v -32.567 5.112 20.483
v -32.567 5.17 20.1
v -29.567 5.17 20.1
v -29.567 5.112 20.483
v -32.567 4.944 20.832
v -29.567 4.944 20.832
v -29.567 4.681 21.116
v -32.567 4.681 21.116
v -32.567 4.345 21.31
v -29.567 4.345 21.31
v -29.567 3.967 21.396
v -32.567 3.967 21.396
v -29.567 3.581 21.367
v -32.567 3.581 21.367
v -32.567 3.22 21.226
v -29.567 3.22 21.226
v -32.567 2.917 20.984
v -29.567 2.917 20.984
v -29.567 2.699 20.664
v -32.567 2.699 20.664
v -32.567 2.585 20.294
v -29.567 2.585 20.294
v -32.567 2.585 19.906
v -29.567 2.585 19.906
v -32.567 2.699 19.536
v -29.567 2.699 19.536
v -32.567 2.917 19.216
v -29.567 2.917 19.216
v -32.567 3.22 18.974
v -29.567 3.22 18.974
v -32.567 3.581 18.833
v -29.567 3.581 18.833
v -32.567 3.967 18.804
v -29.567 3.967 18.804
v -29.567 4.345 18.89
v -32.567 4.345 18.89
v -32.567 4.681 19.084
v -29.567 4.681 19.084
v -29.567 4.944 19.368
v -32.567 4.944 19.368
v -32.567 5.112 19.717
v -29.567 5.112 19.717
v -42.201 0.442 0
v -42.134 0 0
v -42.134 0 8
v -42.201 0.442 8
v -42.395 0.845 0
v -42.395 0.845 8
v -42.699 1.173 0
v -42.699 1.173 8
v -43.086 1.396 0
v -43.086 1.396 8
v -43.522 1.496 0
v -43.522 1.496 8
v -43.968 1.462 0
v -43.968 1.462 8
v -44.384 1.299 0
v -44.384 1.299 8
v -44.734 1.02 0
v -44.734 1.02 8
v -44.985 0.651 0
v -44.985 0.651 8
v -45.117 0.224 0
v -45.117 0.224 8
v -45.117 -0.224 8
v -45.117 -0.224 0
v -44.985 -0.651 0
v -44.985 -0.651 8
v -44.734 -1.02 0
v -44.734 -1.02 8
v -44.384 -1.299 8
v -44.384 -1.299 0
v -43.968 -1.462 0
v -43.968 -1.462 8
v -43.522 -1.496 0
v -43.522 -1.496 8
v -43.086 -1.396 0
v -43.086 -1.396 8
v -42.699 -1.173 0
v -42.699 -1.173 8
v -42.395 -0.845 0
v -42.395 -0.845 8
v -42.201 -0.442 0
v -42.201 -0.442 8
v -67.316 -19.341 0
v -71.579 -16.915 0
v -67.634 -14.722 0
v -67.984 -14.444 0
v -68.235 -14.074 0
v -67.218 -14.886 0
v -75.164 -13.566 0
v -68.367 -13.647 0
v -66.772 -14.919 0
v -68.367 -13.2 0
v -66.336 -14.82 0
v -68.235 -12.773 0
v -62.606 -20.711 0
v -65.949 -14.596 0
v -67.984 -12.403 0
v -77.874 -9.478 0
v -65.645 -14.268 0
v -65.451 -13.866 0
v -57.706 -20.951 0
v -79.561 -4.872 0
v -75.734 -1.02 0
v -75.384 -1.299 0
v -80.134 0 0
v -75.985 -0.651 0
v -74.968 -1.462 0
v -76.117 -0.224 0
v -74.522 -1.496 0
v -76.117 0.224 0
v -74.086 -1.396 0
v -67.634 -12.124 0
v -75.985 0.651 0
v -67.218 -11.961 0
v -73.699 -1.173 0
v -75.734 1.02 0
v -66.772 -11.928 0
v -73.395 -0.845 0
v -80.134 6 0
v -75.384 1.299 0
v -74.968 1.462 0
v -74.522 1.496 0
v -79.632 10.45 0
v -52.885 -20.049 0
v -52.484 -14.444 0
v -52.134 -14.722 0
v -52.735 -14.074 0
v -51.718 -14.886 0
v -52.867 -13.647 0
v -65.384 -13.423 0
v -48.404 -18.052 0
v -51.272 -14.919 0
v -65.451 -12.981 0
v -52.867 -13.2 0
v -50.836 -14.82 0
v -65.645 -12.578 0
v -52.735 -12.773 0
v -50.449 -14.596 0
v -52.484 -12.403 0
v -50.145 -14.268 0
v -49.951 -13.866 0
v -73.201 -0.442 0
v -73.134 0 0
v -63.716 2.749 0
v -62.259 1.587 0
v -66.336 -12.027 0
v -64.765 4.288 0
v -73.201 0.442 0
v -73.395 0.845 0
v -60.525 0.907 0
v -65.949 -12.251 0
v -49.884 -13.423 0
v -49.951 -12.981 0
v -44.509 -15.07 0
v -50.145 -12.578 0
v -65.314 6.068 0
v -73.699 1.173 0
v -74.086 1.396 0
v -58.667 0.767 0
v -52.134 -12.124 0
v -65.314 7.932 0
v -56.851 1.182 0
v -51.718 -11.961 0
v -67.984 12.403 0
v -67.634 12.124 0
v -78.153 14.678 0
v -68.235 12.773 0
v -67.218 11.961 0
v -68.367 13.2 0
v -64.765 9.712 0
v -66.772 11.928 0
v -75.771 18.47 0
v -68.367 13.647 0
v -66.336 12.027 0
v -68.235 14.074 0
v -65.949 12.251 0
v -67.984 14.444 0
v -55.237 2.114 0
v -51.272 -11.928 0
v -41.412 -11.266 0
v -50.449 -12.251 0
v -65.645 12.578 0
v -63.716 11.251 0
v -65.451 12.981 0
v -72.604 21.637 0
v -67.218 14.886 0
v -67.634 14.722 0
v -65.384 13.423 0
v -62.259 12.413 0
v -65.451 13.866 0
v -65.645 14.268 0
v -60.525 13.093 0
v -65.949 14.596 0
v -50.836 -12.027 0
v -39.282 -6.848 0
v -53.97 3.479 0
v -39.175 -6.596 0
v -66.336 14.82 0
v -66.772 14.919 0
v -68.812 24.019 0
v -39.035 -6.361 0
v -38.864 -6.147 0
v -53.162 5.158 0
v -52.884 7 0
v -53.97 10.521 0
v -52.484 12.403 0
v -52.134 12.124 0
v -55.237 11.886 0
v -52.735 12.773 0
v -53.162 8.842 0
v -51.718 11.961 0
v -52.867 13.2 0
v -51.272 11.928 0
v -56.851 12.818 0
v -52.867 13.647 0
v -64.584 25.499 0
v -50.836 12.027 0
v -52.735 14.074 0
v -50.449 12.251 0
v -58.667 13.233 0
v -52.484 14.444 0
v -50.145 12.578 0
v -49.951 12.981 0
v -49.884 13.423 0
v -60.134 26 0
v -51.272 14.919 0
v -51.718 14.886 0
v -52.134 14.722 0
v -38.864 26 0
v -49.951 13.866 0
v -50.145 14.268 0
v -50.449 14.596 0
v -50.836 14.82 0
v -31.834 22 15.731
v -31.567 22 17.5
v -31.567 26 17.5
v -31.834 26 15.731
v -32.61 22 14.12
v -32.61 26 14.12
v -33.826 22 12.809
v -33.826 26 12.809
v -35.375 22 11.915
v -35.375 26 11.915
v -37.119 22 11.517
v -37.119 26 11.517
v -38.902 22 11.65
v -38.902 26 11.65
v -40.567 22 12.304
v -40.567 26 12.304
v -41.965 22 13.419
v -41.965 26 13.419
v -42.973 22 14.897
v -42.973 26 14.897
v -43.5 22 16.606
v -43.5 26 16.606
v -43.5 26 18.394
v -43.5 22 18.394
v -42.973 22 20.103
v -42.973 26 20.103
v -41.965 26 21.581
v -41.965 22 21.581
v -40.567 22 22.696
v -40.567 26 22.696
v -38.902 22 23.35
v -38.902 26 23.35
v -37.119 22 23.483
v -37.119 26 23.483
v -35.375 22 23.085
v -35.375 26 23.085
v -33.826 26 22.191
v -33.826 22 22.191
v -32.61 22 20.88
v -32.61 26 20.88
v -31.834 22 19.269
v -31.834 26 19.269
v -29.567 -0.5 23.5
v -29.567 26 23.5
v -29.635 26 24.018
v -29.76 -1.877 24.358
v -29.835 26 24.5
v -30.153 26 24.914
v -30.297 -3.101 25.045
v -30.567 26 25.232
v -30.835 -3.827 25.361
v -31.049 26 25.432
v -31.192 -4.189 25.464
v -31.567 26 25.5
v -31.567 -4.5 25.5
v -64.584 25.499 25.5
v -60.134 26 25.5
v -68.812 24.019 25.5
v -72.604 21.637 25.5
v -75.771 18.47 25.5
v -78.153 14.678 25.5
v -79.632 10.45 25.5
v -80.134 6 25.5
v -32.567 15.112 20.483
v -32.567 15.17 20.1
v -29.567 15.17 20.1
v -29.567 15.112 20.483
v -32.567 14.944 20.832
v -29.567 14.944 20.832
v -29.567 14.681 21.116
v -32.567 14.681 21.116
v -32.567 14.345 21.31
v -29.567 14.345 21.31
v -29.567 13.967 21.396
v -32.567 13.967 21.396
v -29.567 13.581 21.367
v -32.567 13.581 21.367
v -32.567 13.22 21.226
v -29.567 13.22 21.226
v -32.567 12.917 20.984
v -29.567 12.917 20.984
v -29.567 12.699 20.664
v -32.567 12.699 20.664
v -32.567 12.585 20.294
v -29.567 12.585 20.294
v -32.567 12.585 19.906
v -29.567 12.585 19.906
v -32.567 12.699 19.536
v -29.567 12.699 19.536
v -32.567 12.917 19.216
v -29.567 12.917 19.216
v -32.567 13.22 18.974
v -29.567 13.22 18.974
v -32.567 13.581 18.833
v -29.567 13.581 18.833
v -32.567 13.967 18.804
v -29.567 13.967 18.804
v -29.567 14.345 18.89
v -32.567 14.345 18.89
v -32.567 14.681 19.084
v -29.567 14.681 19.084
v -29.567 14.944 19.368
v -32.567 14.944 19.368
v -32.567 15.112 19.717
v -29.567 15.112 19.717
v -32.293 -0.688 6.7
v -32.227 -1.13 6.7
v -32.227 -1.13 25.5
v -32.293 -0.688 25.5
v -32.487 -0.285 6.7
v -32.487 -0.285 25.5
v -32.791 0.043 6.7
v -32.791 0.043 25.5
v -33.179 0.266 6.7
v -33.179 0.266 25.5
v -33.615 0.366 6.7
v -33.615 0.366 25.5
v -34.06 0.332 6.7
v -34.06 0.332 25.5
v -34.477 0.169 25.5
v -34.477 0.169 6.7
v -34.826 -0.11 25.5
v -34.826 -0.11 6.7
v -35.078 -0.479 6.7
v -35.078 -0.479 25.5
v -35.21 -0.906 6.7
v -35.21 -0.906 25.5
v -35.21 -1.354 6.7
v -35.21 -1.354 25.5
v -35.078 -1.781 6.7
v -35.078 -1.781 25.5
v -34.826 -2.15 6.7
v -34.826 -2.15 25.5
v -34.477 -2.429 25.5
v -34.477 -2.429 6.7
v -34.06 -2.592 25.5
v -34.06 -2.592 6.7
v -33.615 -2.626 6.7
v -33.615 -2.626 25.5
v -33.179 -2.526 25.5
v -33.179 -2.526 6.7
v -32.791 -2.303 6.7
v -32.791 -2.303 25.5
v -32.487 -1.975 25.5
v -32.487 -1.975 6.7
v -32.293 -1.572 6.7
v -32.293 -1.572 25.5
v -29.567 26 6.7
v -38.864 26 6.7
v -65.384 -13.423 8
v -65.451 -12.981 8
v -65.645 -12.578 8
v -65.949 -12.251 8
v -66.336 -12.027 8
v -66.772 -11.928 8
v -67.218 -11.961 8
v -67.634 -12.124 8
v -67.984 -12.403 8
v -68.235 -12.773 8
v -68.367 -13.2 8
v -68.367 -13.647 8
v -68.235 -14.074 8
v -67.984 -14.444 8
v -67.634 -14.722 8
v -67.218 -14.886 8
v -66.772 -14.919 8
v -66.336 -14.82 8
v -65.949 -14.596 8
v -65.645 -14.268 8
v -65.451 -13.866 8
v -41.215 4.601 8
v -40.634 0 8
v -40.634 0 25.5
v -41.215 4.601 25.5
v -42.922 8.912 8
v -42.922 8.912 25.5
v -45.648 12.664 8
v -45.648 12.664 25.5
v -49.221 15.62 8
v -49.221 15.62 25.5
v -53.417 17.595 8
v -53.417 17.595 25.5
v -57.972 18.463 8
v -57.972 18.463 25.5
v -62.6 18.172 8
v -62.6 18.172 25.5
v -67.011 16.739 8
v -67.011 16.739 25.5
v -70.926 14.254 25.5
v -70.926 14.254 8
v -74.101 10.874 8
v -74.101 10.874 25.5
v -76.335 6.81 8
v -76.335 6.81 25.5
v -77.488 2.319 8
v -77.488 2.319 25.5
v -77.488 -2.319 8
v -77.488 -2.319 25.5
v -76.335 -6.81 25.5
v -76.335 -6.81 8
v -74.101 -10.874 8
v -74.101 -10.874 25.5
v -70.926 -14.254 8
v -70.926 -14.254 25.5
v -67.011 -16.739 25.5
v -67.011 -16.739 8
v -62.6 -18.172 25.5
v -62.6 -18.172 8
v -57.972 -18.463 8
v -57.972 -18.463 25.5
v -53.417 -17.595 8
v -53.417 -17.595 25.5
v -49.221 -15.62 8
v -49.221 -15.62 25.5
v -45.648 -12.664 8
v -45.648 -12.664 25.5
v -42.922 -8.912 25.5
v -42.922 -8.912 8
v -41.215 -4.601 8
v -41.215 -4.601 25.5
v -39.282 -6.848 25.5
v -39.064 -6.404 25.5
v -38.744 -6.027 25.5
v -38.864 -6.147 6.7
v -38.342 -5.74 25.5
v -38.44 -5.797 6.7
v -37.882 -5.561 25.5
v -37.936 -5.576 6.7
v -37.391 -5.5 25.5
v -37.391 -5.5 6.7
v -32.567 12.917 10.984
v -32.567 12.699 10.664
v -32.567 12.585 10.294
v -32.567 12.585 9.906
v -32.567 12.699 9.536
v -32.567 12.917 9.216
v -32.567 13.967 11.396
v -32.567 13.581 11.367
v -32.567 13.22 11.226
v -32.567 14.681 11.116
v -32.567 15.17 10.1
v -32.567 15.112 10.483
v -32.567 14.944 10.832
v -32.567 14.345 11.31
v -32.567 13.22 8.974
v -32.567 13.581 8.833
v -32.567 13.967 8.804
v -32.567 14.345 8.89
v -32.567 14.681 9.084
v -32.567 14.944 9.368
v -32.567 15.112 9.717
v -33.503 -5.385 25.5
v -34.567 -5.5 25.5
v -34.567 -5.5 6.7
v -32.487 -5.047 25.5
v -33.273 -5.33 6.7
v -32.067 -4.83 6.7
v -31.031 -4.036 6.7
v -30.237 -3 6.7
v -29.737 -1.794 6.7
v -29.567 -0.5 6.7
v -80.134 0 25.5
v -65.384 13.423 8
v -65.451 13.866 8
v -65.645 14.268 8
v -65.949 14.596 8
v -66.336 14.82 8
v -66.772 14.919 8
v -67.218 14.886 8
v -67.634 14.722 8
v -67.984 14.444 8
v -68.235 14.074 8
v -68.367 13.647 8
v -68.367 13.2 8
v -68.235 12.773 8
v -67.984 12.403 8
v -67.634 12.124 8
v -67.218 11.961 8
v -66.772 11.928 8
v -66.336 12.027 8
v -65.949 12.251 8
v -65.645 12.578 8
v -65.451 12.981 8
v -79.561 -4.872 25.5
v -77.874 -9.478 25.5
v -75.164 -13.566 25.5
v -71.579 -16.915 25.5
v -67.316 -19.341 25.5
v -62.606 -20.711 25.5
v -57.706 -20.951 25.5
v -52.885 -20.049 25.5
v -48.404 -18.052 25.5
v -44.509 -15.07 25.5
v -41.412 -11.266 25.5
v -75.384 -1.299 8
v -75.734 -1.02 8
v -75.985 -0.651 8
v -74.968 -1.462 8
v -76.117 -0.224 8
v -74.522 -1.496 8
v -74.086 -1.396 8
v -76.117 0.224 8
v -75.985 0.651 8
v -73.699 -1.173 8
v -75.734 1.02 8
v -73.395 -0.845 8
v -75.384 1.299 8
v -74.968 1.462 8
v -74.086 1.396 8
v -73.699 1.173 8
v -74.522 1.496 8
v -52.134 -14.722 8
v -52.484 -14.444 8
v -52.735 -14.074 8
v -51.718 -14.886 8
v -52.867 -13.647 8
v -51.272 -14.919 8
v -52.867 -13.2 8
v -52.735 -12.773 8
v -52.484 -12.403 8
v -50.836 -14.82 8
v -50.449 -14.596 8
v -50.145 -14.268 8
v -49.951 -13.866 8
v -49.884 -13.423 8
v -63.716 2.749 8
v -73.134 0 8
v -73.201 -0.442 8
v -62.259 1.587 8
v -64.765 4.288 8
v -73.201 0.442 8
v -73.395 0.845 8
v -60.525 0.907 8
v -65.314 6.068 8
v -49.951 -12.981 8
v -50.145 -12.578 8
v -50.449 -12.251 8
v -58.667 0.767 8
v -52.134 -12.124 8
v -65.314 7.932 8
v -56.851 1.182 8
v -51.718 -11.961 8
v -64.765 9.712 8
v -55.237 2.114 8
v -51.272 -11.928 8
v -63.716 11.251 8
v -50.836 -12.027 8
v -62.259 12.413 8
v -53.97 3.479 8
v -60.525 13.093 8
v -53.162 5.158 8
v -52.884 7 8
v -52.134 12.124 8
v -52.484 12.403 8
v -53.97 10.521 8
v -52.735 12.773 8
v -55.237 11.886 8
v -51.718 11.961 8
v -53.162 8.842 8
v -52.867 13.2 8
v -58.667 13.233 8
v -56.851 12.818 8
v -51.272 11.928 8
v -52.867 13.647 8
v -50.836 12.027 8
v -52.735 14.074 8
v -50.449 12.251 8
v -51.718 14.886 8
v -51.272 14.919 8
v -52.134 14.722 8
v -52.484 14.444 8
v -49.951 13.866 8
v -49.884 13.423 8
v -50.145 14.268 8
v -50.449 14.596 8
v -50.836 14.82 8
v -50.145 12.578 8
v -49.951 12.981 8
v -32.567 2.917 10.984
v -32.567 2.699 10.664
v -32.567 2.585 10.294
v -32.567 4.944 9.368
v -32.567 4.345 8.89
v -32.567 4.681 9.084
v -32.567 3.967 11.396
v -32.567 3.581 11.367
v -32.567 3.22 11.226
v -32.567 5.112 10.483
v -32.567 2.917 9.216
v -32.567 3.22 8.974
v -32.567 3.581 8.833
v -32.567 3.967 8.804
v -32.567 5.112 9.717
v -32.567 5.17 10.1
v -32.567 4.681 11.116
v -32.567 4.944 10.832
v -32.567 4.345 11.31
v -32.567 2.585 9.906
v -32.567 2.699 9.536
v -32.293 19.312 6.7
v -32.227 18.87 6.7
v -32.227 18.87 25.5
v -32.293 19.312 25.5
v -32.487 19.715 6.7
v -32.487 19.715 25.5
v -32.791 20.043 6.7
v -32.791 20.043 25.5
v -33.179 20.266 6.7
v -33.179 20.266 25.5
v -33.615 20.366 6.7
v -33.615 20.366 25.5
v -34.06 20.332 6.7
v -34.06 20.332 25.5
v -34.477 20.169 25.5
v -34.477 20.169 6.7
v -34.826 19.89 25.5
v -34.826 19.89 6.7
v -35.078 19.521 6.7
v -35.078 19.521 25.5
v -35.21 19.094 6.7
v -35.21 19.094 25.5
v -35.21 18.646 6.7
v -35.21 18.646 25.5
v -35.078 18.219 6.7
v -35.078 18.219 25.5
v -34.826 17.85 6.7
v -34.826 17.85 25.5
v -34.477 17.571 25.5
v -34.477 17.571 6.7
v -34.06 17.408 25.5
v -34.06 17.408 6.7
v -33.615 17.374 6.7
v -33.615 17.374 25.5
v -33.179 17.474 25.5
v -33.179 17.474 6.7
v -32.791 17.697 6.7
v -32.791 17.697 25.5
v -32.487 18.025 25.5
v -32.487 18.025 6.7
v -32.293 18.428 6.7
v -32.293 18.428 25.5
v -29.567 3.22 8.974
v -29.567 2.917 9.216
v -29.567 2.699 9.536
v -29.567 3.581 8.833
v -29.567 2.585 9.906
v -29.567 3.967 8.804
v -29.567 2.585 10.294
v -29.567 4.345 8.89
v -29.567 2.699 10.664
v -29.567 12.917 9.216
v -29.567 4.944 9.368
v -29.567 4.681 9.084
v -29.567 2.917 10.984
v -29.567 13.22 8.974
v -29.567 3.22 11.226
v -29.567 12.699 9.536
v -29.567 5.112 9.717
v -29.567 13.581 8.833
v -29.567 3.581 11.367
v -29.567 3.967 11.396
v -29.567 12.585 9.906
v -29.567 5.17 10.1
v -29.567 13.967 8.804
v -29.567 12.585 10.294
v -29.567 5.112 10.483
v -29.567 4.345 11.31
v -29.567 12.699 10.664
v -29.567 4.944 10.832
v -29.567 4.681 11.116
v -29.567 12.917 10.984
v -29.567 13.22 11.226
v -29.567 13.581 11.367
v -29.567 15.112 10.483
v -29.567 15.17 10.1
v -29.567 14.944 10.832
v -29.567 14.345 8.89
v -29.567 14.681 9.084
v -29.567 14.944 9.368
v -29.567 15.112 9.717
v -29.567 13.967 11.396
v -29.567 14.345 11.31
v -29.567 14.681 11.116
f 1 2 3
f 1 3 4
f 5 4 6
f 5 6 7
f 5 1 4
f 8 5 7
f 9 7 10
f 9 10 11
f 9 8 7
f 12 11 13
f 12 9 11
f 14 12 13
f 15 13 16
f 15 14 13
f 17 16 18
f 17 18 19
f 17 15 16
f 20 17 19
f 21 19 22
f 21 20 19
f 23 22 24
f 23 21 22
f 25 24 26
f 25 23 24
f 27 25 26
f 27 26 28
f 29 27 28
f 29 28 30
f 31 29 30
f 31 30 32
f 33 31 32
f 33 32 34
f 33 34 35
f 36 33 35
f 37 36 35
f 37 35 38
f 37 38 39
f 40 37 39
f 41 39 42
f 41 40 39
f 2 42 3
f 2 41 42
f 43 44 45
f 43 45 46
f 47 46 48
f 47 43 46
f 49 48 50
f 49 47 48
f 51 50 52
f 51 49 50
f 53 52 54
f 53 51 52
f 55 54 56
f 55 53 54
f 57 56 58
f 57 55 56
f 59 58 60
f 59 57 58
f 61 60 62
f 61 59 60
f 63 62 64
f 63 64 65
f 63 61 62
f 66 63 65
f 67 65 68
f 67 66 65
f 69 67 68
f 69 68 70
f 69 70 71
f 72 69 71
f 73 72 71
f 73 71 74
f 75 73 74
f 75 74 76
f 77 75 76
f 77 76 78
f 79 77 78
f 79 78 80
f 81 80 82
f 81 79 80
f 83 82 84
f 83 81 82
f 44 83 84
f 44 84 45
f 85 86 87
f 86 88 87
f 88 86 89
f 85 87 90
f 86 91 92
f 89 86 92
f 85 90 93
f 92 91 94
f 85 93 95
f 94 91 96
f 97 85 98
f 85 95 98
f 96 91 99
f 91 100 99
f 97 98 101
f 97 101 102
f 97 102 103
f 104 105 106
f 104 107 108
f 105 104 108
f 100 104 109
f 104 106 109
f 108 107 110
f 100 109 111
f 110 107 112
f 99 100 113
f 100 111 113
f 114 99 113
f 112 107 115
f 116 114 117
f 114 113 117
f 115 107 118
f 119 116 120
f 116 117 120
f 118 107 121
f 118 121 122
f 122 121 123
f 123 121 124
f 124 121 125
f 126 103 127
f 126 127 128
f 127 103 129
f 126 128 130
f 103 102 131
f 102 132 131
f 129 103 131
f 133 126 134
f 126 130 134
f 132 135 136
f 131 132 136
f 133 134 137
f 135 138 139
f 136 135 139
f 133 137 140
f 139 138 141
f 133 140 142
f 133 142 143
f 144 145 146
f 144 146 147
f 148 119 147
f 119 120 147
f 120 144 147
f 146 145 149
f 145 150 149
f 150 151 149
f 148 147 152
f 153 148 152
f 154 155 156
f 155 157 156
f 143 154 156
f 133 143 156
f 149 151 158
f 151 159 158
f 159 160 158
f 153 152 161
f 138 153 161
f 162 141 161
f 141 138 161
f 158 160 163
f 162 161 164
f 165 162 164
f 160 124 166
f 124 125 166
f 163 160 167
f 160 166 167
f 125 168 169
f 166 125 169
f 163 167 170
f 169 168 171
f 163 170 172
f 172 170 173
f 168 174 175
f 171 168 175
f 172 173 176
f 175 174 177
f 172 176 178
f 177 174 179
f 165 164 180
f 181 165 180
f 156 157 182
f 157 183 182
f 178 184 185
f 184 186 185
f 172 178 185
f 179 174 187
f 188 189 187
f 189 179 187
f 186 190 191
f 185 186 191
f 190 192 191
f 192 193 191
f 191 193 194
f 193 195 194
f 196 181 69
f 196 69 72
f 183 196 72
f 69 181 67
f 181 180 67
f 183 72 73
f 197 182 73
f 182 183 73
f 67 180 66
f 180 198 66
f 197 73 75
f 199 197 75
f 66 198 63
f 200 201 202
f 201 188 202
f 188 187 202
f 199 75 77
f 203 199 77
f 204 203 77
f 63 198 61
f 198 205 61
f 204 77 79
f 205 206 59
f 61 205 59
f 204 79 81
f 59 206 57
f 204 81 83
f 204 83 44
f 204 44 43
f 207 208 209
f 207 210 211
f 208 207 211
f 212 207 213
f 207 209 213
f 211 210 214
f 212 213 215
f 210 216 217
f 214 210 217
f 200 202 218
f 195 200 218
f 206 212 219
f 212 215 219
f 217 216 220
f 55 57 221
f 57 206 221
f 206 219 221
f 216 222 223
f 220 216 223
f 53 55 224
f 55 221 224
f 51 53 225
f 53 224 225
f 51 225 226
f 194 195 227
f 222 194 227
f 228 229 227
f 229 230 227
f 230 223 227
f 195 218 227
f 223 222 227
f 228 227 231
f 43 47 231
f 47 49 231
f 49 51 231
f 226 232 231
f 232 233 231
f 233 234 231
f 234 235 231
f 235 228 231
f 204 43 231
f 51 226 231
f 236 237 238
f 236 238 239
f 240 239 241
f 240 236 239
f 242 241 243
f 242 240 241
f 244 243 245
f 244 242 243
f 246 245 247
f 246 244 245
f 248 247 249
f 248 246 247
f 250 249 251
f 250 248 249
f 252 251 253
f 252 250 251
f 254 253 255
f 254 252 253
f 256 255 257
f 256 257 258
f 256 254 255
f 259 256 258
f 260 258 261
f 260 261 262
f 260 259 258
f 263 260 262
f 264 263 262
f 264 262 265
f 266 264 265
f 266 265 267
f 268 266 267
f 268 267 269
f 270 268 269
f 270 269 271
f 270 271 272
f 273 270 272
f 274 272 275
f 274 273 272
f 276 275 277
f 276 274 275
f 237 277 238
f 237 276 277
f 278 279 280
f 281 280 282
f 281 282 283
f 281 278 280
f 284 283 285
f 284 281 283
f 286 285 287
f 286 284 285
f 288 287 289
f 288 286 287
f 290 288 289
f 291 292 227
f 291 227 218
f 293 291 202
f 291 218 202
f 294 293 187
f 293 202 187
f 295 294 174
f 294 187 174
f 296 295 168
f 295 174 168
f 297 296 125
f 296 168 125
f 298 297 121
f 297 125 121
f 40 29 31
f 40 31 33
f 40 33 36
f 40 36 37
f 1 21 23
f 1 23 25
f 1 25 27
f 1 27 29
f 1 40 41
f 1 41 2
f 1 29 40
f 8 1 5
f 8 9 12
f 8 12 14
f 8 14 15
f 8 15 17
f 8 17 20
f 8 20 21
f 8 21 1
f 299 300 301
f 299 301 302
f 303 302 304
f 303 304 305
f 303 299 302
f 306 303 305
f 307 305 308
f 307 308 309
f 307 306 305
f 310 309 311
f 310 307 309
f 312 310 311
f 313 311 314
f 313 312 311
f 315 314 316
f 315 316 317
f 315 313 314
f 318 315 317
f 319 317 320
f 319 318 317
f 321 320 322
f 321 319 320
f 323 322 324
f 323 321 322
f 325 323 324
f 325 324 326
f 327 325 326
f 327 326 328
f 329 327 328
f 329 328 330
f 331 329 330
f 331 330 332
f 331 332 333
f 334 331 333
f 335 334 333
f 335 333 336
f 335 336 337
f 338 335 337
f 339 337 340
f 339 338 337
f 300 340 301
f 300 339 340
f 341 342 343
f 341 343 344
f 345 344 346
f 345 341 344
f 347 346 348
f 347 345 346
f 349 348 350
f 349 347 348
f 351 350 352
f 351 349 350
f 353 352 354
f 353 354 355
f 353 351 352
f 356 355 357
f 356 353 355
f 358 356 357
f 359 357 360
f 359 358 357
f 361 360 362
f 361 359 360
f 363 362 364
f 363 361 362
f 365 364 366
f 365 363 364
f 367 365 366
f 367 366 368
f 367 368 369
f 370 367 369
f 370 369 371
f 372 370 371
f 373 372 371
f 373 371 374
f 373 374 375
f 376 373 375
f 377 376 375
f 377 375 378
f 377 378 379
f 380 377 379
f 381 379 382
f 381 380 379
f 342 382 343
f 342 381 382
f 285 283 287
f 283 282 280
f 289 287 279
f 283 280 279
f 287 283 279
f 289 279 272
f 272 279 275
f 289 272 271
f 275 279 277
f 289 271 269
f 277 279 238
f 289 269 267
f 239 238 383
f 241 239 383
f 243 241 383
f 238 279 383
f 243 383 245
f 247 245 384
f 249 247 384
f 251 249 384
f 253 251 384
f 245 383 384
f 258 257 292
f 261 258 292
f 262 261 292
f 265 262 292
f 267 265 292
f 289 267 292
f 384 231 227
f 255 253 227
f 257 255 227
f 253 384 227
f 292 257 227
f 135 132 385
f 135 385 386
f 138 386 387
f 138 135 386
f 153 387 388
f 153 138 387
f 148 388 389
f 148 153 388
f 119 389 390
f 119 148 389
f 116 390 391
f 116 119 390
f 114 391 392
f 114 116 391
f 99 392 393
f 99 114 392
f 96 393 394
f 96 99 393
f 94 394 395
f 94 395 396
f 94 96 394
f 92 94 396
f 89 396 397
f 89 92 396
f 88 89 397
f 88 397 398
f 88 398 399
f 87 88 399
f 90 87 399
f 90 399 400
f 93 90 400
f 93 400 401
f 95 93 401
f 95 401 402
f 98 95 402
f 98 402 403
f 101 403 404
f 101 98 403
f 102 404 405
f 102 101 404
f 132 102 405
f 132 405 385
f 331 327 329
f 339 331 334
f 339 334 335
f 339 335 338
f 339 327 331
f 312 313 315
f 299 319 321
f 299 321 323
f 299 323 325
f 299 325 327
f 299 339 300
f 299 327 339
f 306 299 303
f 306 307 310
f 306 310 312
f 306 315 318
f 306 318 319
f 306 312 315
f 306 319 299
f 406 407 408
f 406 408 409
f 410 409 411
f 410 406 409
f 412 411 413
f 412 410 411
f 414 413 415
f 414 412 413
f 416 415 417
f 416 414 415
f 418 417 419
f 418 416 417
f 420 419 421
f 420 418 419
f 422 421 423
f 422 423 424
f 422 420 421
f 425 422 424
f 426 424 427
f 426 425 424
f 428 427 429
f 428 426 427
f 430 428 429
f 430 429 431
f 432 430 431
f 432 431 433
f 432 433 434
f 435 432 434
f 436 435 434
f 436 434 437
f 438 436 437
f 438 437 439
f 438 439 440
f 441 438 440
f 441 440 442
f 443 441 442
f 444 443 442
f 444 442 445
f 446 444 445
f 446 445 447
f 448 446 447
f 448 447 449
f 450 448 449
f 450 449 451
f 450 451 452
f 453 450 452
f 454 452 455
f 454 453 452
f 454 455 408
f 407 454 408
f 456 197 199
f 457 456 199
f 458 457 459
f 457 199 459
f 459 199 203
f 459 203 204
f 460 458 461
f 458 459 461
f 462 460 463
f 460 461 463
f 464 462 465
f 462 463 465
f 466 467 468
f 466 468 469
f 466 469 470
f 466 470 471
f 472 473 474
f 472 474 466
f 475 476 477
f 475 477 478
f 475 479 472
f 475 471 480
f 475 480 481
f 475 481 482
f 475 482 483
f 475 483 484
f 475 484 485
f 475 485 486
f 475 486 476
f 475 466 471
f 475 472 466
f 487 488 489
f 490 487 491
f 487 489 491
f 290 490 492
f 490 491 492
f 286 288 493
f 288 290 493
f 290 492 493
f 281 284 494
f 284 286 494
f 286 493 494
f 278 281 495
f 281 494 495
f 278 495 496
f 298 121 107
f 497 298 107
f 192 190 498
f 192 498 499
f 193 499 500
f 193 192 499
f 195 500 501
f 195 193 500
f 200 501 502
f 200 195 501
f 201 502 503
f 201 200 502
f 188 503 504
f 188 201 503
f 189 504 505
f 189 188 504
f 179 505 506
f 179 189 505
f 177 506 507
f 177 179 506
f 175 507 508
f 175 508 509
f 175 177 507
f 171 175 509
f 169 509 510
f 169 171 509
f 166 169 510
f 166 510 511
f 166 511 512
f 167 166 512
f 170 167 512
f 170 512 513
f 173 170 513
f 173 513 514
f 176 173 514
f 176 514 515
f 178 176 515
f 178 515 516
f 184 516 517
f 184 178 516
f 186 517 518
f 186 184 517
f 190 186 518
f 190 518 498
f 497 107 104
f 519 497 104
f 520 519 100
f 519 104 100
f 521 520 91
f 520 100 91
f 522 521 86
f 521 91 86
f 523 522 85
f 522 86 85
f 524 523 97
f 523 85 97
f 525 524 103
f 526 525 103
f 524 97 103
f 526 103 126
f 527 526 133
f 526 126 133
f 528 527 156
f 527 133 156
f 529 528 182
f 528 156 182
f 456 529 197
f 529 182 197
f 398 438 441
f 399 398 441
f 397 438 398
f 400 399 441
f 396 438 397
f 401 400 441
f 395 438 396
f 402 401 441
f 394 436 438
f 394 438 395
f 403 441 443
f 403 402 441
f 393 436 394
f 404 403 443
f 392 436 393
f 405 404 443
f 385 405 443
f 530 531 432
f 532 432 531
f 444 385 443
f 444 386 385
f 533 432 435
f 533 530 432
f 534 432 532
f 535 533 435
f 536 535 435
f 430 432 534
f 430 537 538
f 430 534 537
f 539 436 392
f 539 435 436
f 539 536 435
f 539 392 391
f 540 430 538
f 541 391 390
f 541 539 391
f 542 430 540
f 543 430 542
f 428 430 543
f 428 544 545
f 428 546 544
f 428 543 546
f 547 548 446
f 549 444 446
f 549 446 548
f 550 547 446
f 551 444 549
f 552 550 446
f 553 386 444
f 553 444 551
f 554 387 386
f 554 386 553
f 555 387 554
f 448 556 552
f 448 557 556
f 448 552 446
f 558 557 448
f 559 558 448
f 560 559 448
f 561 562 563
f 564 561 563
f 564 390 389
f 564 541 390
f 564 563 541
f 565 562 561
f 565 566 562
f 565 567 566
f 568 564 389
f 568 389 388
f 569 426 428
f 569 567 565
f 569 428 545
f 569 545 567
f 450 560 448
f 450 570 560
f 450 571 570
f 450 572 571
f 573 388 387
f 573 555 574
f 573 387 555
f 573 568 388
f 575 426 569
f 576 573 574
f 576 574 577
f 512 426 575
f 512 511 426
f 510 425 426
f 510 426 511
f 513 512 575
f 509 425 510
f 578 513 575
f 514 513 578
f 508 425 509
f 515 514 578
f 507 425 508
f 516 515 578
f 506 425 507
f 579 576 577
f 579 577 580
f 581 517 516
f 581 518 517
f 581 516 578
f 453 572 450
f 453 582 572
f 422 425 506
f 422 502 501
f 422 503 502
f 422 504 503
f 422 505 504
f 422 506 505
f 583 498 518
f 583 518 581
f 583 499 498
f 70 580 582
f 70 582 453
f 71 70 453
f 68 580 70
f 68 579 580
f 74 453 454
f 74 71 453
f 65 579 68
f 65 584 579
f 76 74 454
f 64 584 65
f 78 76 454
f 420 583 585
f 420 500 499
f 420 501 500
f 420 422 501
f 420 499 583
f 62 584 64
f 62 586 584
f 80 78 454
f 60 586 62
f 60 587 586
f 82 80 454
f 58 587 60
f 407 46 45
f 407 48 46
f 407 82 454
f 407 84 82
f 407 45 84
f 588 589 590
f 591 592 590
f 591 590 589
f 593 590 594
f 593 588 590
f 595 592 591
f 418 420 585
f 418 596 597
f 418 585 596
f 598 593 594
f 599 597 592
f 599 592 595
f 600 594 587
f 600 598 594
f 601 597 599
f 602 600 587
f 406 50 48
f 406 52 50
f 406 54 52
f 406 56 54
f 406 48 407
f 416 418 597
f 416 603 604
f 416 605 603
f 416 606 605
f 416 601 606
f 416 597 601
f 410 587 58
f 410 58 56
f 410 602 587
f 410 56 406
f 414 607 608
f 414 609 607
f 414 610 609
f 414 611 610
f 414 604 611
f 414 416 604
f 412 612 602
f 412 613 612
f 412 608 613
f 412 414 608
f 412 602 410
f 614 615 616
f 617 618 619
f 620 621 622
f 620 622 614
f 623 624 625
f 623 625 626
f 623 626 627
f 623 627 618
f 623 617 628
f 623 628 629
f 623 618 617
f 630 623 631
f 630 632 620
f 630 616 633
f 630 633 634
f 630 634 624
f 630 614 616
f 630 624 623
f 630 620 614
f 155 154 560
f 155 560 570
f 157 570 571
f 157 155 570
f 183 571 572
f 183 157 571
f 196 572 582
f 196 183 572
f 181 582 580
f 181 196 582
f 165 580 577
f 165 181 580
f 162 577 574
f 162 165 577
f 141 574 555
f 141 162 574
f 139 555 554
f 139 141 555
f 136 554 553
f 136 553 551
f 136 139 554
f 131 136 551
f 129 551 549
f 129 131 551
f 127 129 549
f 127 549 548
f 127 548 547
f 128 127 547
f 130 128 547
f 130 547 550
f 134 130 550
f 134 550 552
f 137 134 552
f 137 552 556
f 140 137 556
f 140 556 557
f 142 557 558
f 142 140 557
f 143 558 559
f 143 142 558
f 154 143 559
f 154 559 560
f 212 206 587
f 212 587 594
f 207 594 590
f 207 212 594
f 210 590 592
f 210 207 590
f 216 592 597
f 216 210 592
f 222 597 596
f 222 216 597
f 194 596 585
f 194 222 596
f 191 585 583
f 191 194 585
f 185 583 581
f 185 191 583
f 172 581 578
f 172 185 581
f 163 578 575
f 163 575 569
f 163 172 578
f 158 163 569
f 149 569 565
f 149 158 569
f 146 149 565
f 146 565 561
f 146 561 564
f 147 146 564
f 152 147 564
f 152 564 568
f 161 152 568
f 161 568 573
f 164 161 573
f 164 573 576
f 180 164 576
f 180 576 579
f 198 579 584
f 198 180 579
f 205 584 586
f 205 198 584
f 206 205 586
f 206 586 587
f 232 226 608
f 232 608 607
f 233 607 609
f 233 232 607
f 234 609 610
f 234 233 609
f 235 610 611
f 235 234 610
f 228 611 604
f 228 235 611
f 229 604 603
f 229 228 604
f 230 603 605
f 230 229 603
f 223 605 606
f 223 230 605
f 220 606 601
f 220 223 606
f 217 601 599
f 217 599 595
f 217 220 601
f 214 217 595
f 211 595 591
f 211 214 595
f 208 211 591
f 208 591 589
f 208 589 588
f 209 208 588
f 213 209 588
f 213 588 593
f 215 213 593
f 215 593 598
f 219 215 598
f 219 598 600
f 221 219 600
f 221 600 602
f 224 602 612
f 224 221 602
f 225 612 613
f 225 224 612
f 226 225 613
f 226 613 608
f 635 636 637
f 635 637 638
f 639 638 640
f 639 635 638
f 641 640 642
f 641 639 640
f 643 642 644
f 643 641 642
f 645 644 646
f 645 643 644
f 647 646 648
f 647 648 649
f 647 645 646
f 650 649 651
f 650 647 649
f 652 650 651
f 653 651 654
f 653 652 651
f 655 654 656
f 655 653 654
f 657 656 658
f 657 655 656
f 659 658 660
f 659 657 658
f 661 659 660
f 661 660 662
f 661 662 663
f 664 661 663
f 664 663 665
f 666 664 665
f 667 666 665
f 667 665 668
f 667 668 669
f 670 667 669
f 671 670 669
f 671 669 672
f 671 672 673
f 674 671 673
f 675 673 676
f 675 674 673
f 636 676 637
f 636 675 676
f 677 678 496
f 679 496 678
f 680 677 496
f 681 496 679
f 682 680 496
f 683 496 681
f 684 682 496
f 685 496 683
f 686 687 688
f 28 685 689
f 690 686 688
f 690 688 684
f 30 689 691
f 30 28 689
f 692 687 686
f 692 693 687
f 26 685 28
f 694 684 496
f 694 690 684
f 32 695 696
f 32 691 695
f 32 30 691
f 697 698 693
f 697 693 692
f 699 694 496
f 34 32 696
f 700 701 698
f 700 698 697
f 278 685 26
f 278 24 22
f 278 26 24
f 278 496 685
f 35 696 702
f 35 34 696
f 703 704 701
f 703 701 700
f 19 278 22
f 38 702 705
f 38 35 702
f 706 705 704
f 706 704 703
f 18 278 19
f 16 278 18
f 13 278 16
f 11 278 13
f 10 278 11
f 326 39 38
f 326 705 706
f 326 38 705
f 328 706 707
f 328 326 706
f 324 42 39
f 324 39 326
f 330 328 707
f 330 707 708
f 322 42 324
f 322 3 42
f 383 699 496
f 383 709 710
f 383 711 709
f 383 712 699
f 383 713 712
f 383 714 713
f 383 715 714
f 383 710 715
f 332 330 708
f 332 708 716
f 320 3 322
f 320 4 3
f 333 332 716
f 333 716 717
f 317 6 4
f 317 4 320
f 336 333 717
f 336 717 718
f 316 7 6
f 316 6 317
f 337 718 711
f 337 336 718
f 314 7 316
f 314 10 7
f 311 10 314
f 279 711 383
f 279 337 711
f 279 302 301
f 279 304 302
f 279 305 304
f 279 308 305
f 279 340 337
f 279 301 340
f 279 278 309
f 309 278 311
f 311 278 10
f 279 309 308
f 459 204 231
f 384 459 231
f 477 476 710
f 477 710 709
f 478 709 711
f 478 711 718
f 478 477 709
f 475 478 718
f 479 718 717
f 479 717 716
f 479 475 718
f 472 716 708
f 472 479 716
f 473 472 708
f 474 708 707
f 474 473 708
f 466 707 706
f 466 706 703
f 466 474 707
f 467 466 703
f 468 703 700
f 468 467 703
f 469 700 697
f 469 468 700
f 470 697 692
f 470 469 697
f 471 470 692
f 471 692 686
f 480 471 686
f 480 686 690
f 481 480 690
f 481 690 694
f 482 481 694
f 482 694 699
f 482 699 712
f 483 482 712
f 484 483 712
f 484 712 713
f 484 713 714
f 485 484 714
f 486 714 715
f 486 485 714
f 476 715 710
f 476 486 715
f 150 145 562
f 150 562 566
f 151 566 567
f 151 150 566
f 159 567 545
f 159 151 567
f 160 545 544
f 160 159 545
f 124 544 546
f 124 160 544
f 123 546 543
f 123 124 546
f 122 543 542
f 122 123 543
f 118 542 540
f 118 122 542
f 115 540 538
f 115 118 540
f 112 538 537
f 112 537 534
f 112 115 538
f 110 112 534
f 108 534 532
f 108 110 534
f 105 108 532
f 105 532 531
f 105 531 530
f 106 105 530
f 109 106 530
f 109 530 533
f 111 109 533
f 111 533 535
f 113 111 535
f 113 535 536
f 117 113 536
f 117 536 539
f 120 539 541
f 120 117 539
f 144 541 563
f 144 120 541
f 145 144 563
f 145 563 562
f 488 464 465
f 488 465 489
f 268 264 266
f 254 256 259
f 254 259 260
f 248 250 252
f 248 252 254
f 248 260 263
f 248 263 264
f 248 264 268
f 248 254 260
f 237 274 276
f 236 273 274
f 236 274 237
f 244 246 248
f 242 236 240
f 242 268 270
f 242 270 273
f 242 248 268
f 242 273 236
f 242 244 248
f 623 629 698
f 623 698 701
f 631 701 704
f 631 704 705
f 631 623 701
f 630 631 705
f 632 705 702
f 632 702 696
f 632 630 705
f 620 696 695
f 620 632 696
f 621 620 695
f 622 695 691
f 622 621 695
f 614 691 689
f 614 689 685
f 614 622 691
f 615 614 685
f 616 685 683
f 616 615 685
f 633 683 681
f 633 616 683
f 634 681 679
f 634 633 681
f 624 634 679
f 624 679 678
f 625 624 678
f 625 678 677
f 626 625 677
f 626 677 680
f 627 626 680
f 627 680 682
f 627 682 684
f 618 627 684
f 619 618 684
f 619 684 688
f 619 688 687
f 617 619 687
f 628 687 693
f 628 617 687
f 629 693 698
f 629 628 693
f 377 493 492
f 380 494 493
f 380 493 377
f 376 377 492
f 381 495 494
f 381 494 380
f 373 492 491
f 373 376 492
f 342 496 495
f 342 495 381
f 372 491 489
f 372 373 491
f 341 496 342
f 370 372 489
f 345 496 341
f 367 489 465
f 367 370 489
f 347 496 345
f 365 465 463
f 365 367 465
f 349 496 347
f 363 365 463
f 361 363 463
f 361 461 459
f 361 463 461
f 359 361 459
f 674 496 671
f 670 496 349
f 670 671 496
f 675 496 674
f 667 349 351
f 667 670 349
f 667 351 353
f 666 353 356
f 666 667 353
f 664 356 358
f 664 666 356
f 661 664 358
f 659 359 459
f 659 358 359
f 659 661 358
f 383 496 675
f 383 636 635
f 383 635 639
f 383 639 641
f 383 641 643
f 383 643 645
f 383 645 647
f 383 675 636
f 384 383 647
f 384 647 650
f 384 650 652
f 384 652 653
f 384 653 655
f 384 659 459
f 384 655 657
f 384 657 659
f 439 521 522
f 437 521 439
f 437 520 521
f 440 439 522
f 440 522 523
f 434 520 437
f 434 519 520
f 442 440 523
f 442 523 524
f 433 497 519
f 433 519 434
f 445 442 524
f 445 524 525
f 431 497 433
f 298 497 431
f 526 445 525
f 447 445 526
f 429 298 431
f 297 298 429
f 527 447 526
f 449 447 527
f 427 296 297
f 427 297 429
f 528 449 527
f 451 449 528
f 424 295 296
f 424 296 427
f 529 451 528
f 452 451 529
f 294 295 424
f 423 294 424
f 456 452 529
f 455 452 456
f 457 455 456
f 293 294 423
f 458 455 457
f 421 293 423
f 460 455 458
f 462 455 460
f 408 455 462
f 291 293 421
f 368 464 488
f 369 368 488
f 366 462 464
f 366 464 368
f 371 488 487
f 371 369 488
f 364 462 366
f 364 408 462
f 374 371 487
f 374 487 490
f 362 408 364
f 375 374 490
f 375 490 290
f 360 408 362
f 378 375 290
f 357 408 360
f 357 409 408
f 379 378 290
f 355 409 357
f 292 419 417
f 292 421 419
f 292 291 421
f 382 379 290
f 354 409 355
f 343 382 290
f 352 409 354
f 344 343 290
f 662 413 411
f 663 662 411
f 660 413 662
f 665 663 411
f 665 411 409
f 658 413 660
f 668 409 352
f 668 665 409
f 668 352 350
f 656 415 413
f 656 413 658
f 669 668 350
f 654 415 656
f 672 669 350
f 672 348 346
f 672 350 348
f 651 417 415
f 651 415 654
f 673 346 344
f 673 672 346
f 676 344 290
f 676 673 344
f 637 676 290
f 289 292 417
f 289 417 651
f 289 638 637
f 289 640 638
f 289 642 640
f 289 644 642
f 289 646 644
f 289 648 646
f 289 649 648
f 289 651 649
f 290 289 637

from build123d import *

# Parameters (mm, degrees)
SKETCH_1_R                = 1.5
SKETCH_1_R_2              = 6.25
EXTRUDE_1_DEPTH           = 25.5
SKETCH_2_R                = 18.5
CUT_EXTRUDE_1_DEPTH       = 17.5
SKETCH_3_W                = 9.3
SKETCH_3_H                = 31.5
CUT_EXTRUDE_2_DEPTH       = 6.7
FILLET_1_R                = 20
SKETCH_4_R                = 1.5
CUT_EXTRUDE_3_DEPTH       = 44.630787393
FILLET_3_R                = 2
FILLET_4_R                = 2
FILLET_5_R                = 5
SKETCH_5_R                = 6
CUT_EXTRUDE_4_DEPTH       = 4
SKETCH_6_R                = 1.3
CUT_EXTRUDE_5_DEPTH       = 3
MOVE_BODY_1_OUTLINE_R     = 1.5
MOVE_BODY_1_OUTLINE_R_2   = 6.25
MOVE_BODY_1_DEPTH         = 25.5
MOVE_START                = 6.7
MOVE_BODY_1_2_OUTLINE_R   = 1.5
MOVE_BODY_1_2_OUTLINE_R_2 = 18.5
MOVE_BODY_1_2_DEPTH       = 18.8
MOVE_BODY_1_3_OUTLINE_R   = 1.5
MOVE_BODY_1_3_OUTLINE_R_2 = 6.25
MOVE_BODY_1_3_DEPTH       = 8
MOVE_START_2              = -29.5669682
MOVE_BODY_1_4_OUTLINE_W   = 31.5
MOVE_BODY_1_4_OUTLINE_H   = 18.8
MOVE_BODY_1_4_DEPTH       = 9.2969682
MOVE_START_3              = -32.5669682
MOVE_BODY_1_5_OUTLINE_R   = 1.3
MOVE_BODY_1_5_DEPTH       = 3
MOVE_START_4              = -21
MOVE_BODY_1_6_DEPTH       = 47
MOVE_START_5              = 22
MOVE_BODY_1_7_OUTLINE_R   = 6
MOVE_BODY_1_7_DEPTH       = 4


with BuildPart() as part:
    # 草图1 → 凸台-拉伸1 (new body)
    with BuildSketch(Plane.XY):
        with BuildLine():
            Line((21, 0), (21, 26))
            Line((21, 26), (-29.5669682, 26))
            Line((-29.5669682, 26), (-29.5669682, -5.5))
            Line((-29.5669682, -5.5), (-20.2669682, -5.5))
            ThreePointArc((-20.2669682, -5.5), (2.774316836, -20.815935388), (21, 0))
        make_face()
        with Locations((15.5, 0)):
            Circle(SKETCH_1_R, mode=Mode.SUBTRACT)
        with Locations((-15.5, 0)):
            Circle(SKETCH_1_R, mode=Mode.SUBTRACT)
        with Locations((-7.75, 13.423393759)):
            Circle(SKETCH_1_R, mode=Mode.SUBTRACT)
        with Locations((7.75, 13.423393759)):
            Circle(SKETCH_1_R, mode=Mode.SUBTRACT)
        with Locations((7.75, -13.423393759)):
            Circle(SKETCH_1_R, mode=Mode.SUBTRACT)
        with Locations((-7.75, -13.423393759)):
            Circle(SKETCH_1_R, mode=Mode.SUBTRACT)
        with Locations((0, 7)):
            Circle(SKETCH_1_R_2, mode=Mode.SUBTRACT)
    extrude(amount=EXTRUDE_1_DEPTH)

    # 草图2 → 切除-拉伸1 (cut)
    with BuildSketch(Plane.XY.offset(25.5)):
        Circle(SKETCH_2_R)
    extrude(amount=-CUT_EXTRUDE_1_DEPTH, mode=Mode.SUBTRACT)

    # 草图3 → 切除-拉伸2 (cut)
    with BuildSketch(Plane(origin=(0, 0, 0), x_dir=(-1, 0, 0), z_dir=(0, 0, -1))):
        with Locations((24.92, 10.25)):
            Rectangle(SKETCH_3_W, SKETCH_3_H)
    extrude(amount=-CUT_EXTRUDE_2_DEPTH, mode=Mode.SUBTRACT)

    # 圆角1
    fillet_1_edges = [part.edges().sort_by_distance(p)[0] for p in [
        (21, 26, 12.75),
    ]]
    fillet(fillet_1_edges, radius=FILLET_1_R)

    # 草图4 → 切除-拉伸3 (cut, through all)
    with BuildSketch(Plane(origin=(0, 0, 6.7), x_dir=(-1, 0, 0), z_dir=(0, 0, -1))):
        with Locations((25.407304845, 18.87)):
            Circle(SKETCH_4_R)
        with Locations((25.407304845, -1.13)):
            Circle(SKETCH_4_R)
    extrude(amount=-CUT_EXTRUDE_3_DEPTH, mode=Mode.SUBTRACT)

    # 圆角3
    fillet_3_edges = [part.edges().sort_by_distance(p)[0] for p in [
        (-29.5669682, 10.25, 25.5),
    ]]
    fillet(fillet_3_edges, radius=FILLET_3_R)

    # 圆角4
    fillet_4_edges = [part.edges().sort_by_distance(p)[0] for p in [
        (-20.2669682, -5.5, 12.75),
    ]]
    fillet(fillet_4_edges, radius=FILLET_4_R)

    # 圆角5
    # the kernel refuses this fillet: 5 mm, written as the material it takes off along each edge
    with BuildSketch(Plane(origin=(-29.5669682, -5.5, -5.8), x_dir=(1, 0, 0), z_dir=(0, 0, 1))) as fillet_5_piece_1:
        with BuildLine():
            CenterArc((FILLET_5_R, FILLET_5_R), FILLET_5_R, 180, 90)
            Line((0, FILLET_5_R), (0, 0))
            Line((0, 0), (FILLET_5_R, 0))
        make_face()
    extrude(amount=41.8, mode=Mode.SUBTRACT)

    # 草图5 → 切除-拉伸4 (cut)
    with BuildSketch(Plane(origin=(0, 26, 0), x_dir=(1, 0, 0), z_dir=(0, 1, 0))):
        with Locations(Location((-21.5669682, -17.5, 0), (0, 0, 270))):
            Circle(SKETCH_5_R)
    extrude(amount=-CUT_EXTRUDE_4_DEPTH, mode=Mode.SUBTRACT)

    # 草图6 → 切除-拉伸5 (cut)
    with BuildSketch(Plane.ZY.offset(29.5669682)):
        with Locations(Location((20.1, 13.87, 0), (0, 0, 270))):
            Circle(SKETCH_6_R)
        with Locations(Location((20.1, 3.87, 0), (0, 0, 270))):
            Circle(SKETCH_6_R)
        with Locations(Location((10.1, 3.87, 0), (0, 0, 270))):
            Circle(SKETCH_6_R)
        with Locations(Location((10.1, 13.87, 0), (0, 0, 270))):
            Circle(SKETCH_6_R)
    extrude(amount=-CUT_EXTRUDE_5_DEPTH, mode=Mode.SUBTRACT)

    # Move Body 1: read off the stored shape, not the designer's step
    # Move Body 1 outline → Move Body 1 (cut)
    with BuildSketch(Plane.XY):
        with BuildLine():
            Line((1, 26), (-20.27, 26))
            Line((-20.27, 26), (-20.27, 22))
            Line((-20.27, 22), (-20.27, -6.146923411))
            ThreePointArc((-20.27, -6.146923411), (-20.024941251, -6.475836873), (-19.852135348, -6.847826087))
            ThreePointArc((-19.852135348, -6.847826087), (3.471682423, -20.711045873), (21, 0))
            Line((21, 0), (21, 6))
            ThreePointArc((21, 6), (15.142135624, 20.142135624), (1, 26))
        make_face()
        with Locations((7.75, 13.423393759)):
            Circle(MOVE_BODY_1_OUTLINE_R, mode=Mode.SUBTRACT)
        with Locations((-7.75, -13.423393759)):
            Circle(MOVE_BODY_1_OUTLINE_R, mode=Mode.SUBTRACT)
        with Locations((7.75, -13.423393759)):
            Circle(MOVE_BODY_1_OUTLINE_R, mode=Mode.SUBTRACT)
        with Locations((-15.5, 0)):
            Circle(MOVE_BODY_1_OUTLINE_R, mode=Mode.SUBTRACT)
        with Locations((15.5, 0)):
            Circle(MOVE_BODY_1_OUTLINE_R, mode=Mode.SUBTRACT)
        with Locations((-7.75, 13.423393759)):
            Circle(MOVE_BODY_1_OUTLINE_R, mode=Mode.SUBTRACT)
        with Locations((0, 7)):
            Circle(MOVE_BODY_1_OUTLINE_R_2, mode=Mode.SUBTRACT)
    extrude(amount=MOVE_BODY_1_DEPTH, mode=Mode.SUBTRACT)

    # Move Body 1 2 outline → Move Body 1 2 (add)
    with BuildSketch(Plane.XY.offset(MOVE_START)):
        with BuildLine():
            Line((-20.27, 26), (-60.133936399, 26))
            ThreePointArc((-60.133936399, 26), (-74.276072023, 20.142135624), (-80.133936399, 6))
            Line((-80.133936399, 6), (-80.133936399, 0))
            ThreePointArc((-80.133936399, 0), (-62.605618822, -20.711045873), (-39.281801051, -6.847826087))
            ThreePointArc((-39.281801051, -6.847826087), (-38.552080618, -5.871450365), (-37.391121494, -5.5))
            Line((-37.391121494, -5.5), (-34.5669682, -5.5))
            ThreePointArc((-34.5669682, -5.5), (-31.031434294, -4.035533906), (-29.5669682, -0.5))
            ThreePointArc((-29.5669682, -0.5), (-28.102502106, -4.035533905), (-24.5669682, -5.5))
            Line((-24.5669682, -5.5), (-21.742814905, -5.5))
            ThreePointArc((-21.742814905, -5.5), (-20.938499413, -5.668859211), (-20.27, -6.146923411))
            Line((-20.27, -6.146923411), (-20.27, 22))
            Line((-20.27, 22), (-20.27, 26))
        make_face()
        with Locations((-33.726631554, -1.13)):
            Circle(MOVE_BODY_1_2_OUTLINE_R, mode=Mode.SUBTRACT)
        with Locations((-25.407304845, -1.13)):
            Circle(MOVE_BODY_1_2_OUTLINE_R, mode=Mode.SUBTRACT)
        with Locations((-33.726631554, 18.87)):
            Circle(MOVE_BODY_1_2_OUTLINE_R, mode=Mode.SUBTRACT)
        with Locations((-25.407304845, 18.87)):
            Circle(MOVE_BODY_1_2_OUTLINE_R, mode=Mode.SUBTRACT)
        with Locations((-59.133936399, 0)):
            Circle(MOVE_BODY_1_2_OUTLINE_R_2, mode=Mode.SUBTRACT)
    extrude(amount=MOVE_BODY_1_2_DEPTH)

    # Move Body 1 3 outline → Move Body 1 3 (add)
    with BuildSketch(Plane.XY):
        with BuildLine():
            Line((-38.863936399, 22), (-38.863936399, 26))
            Line((-38.863936399, 26), (-60.133936399, 26))
            ThreePointArc((-60.133936399, 26), (-74.276072023, 20.142135624), (-80.133936399, 6))
            Line((-80.133936399, 6), (-80.133936399, 0))
            ThreePointArc((-80.133936399, 0), (-62.605618822, -20.711045873), (-39.281801051, -6.847826087))
            ThreePointArc((-39.281801051, -6.847826087), (-39.108995148, -6.475836873), (-38.863936399, -6.146923411))
            Line((-38.863936399, -6.146923411), (-38.863936399, 22))
        make_face()
        with Locations((-51.383936399, 13.423393759)):
            Circle(MOVE_BODY_1_3_OUTLINE_R, mode=Mode.SUBTRACT)
        with Locations((-66.883936399, -13.423393759)):
            Circle(MOVE_BODY_1_3_OUTLINE_R, mode=Mode.SUBTRACT)
        with Locations((-51.383936399, -13.423393759)):
            Circle(MOVE_BODY_1_3_OUTLINE_R, mode=Mode.SUBTRACT)
        with Locations((-74.633936399, 0)):
            Circle(MOVE_BODY_1_3_OUTLINE_R, mode=Mode.SUBTRACT)
        with Locations((-43.633936399, 0)):
            Circle(MOVE_BODY_1_3_OUTLINE_R, mode=Mode.SUBTRACT)
        with Locations((-59.133936399, 7)):
            Circle(MOVE_BODY_1_3_OUTLINE_R_2, mode=Mode.SUBTRACT)
        with Locations((-66.883936399, 13.423393759)):
            Circle(MOVE_BODY_1_3_OUTLINE_R, mode=Mode.SUBTRACT)
    extrude(amount=MOVE_BODY_1_3_DEPTH)

    # Move Body 1 4 outline → Move Body 1 4 (cut)
    with BuildSketch(Plane.YZ.offset(MOVE_START_2)):
        with Locations((10.25, 16.1)):
            Rectangle(MOVE_BODY_1_4_OUTLINE_W, MOVE_BODY_1_4_OUTLINE_H)
    extrude(amount=MOVE_BODY_1_4_DEPTH, mode=Mode.SUBTRACT)

    # Move Body 1 5 outline → Move Body 1 5 (cut)
    with BuildSketch(Plane.YZ.offset(MOVE_START_3)):
        with Locations((13.87, 20.1)):
            Circle(MOVE_BODY_1_5_OUTLINE_R)
        with Locations((3.87, 20.1)):
            Circle(MOVE_BODY_1_5_OUTLINE_R)
        with Locations((3.87, 10.1)):
            Circle(MOVE_BODY_1_5_OUTLINE_R)
        with Locations((13.87, 10.1)):
            Circle(MOVE_BODY_1_5_OUTLINE_R)
    extrude(amount=MOVE_BODY_1_5_DEPTH, mode=Mode.SUBTRACT)

    # Move Body 1 6 outline → Move Body 1 6 (cut)
    with BuildSketch(Plane(origin=(0, 0, 0), x_dir=(1, 0, 0), z_dir=(0, 1, 0)).offset(MOVE_START_4)):
        with BuildLine():
            ThreePointArc((-29.5669682, -23.5), (-30.152754638, -24.914213563), (-31.5669682, -25.5))
            Line((-31.5669682, -25.5), (-20.27, -25.5))
            Line((-20.27, -25.5), (-20.27, -6.7))
            Line((-20.27, -6.7), (-29.566968204, -6.7))
            Line((-29.566968204, -6.7), (-29.5669682, -23.5))
        make_face()
    extrude(amount=MOVE_BODY_1_6_DEPTH, mode=Mode.SUBTRACT)

    # Move Body 1 7 outline → Move Body 1 7 (cut)
    with BuildSketch(Plane(origin=(0, 0, 0), x_dir=(1, 0, 0), z_dir=(0, 1, 0)).offset(MOVE_START_5)):
        with Locations((-37.5669682, -17.5)):
            Circle(MOVE_BODY_1_7_OUTLINE_R)
    extrude(amount=MOVE_BODY_1_7_DEPTH, mode=Mode.SUBTRACT)


solid = part.part
